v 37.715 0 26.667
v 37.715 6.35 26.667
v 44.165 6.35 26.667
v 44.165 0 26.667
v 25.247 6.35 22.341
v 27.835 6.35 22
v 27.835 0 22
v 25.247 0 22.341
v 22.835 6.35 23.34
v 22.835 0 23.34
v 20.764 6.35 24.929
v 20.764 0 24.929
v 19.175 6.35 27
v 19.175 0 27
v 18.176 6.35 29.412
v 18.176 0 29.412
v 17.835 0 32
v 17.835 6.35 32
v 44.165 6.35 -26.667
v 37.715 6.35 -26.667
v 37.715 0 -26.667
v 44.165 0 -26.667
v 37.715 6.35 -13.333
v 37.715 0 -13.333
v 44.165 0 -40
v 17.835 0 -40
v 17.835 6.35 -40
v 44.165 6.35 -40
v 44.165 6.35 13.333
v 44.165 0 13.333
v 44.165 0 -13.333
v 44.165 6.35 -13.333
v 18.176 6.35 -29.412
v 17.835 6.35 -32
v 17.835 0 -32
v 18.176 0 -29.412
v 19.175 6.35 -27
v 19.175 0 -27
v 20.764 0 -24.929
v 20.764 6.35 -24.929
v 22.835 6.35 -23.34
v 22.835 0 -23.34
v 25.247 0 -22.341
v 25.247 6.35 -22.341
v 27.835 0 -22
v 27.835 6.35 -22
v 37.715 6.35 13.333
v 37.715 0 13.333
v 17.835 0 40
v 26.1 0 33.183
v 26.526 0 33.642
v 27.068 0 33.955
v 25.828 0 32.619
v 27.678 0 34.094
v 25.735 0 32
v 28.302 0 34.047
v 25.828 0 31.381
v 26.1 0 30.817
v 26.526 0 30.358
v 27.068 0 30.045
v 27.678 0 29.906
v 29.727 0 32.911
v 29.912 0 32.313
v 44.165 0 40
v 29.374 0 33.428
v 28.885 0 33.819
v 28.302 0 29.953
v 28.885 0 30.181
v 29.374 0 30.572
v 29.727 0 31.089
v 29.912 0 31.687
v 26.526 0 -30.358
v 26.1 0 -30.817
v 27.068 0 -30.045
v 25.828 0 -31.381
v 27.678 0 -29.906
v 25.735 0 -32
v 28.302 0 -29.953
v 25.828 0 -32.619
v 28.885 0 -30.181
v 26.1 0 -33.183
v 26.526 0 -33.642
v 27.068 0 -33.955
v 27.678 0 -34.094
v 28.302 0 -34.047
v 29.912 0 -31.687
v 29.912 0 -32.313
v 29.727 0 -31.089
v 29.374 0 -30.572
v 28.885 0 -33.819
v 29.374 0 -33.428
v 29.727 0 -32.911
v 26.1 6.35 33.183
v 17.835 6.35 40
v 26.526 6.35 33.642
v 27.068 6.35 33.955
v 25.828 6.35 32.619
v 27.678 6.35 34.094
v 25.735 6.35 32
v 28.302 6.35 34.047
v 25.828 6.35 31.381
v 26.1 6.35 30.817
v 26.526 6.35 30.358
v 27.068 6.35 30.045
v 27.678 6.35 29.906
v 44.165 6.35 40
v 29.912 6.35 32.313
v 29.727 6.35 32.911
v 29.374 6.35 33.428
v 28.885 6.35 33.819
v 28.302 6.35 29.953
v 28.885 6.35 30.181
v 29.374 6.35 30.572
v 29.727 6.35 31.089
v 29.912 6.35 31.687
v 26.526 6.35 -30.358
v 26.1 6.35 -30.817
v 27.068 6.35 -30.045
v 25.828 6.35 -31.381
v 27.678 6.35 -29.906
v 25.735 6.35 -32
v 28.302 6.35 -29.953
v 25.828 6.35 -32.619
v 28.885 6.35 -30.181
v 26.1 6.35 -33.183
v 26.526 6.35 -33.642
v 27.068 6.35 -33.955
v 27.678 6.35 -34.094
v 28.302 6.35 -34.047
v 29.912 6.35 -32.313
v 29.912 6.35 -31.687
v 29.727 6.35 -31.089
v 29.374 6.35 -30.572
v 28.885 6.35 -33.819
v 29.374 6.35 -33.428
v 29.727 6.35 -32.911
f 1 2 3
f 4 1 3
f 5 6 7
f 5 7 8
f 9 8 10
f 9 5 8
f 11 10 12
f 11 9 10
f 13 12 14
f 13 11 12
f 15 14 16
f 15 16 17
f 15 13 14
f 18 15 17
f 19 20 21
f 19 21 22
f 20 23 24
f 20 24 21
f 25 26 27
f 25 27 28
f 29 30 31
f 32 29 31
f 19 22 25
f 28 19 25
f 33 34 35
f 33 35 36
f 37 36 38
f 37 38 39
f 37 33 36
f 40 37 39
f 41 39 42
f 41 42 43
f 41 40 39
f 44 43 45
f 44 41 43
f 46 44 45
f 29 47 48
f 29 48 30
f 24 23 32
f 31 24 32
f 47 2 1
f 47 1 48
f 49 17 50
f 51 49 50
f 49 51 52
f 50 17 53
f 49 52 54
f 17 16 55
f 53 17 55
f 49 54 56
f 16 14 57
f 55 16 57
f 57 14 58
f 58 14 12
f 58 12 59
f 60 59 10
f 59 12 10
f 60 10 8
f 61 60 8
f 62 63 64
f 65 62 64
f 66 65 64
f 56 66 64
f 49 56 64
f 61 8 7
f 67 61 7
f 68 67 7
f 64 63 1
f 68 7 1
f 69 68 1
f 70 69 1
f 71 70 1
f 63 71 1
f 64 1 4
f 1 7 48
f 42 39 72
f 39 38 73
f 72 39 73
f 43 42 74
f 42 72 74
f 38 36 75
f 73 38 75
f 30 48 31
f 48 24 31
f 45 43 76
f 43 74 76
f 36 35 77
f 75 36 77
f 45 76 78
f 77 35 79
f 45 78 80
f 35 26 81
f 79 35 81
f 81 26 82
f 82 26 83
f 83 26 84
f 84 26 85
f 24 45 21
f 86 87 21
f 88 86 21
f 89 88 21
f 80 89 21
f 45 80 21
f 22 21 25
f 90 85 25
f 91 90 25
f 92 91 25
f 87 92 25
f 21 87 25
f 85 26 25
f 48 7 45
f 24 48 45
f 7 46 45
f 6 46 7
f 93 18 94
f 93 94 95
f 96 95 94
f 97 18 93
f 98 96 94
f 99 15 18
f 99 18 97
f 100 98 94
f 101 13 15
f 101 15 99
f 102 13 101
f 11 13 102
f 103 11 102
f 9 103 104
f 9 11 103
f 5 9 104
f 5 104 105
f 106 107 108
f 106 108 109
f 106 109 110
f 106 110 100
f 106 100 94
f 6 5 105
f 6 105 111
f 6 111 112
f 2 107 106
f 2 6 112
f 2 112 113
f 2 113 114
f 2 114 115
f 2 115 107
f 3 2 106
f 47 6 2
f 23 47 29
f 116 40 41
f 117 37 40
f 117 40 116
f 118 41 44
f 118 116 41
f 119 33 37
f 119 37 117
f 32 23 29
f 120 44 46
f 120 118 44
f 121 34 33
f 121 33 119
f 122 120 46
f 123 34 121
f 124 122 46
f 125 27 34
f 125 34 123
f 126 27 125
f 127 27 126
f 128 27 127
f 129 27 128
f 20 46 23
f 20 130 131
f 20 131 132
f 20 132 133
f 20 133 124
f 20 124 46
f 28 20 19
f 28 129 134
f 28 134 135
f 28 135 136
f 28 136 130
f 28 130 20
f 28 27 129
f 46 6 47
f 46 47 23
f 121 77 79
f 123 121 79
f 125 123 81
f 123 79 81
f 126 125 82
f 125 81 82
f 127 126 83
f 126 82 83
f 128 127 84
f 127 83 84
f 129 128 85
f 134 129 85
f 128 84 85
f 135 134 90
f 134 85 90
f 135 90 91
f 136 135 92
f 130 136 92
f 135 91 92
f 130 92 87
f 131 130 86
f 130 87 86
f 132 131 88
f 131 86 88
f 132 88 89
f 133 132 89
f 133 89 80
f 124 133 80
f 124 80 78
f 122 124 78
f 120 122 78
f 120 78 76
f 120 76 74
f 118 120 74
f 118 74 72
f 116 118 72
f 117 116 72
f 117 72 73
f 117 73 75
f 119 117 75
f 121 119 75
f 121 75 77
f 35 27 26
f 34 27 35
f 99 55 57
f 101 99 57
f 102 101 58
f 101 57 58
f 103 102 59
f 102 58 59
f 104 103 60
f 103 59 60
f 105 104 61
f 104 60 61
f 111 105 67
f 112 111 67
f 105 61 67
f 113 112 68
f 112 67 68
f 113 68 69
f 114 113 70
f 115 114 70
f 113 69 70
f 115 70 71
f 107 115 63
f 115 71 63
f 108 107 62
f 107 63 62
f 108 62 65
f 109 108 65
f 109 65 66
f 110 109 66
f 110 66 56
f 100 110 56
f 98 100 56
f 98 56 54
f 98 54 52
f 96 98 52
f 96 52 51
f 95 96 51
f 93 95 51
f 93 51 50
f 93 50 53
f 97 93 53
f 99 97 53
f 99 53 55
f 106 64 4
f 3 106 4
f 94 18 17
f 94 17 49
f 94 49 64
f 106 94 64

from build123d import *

# Parameters (mm, degrees)
SKETCH2_W           = 88.33
SKETCH2_H           = 80
BOSS_EXTRUDE1_DEPTH = 6.35
SKETCH3_W           = 6.45
SKETCH3_H           = 13.333333334
CUT_EXTRUDE1_DEPTH  = 60.923866072
M5_TAPPED_HOLE1_D   = 4.2
CUT_EXTRUDE2_DEPTH  = 10
CUT_EXTRUDE3_REACH  = 61.924


with BuildPart() as part:
    # Sketch2 → Boss-Extrude1 (new body)
    with BuildSketch(Plane(origin=(0, 0, 0), x_dir=(1, 0, 0), z_dir=(0, 1, 0))):
        Rectangle(SKETCH2_W, SKETCH2_H)
    extrude(amount=BOSS_EXTRUDE1_DEPTH)

    # Sketch3 → Cut-Extrude1 (cut, through all)
    with BuildSketch(Plane(origin=(0, 6.35, 0), x_dir=(1, 0, 0), z_dir=(0, 1, 0))):
        with Locations((40.94, -20)):
            Rectangle(SKETCH3_W, SKETCH3_H)
        with Locations((40.94, 20)):
            Rectangle(SKETCH3_W, SKETCH3_H)
    extrude(amount=-CUT_EXTRUDE1_DEPTH, mode=Mode.SUBTRACT)

    # M5 Tapped Hole1 (through all)
    with Locations(Plane(origin=(0, 6.35, 0), x_dir=(1, 0, 0), z_dir=(0, 1, 0))):
        with Locations((-36.165, 32), (27.835, 32), (-36.165, -32), (27.835, -32)):
            Hole(M5_TAPPED_HOLE1_D / 2)

    # Sketch7 → Cut-Extrude2 (cut)
    with BuildSketch(Plane(origin=(0, 6.35, 0), x_dir=(1, 0, 0), z_dir=(0, 1, 0))):
        with BuildLine():
            Line((-26.165, 32), (-14.165, 32))
            ThreePointArc((-14.165, 32), (-10.629466094, 30.535533906), (-9.165, 27))
            Line((-9.165, 27), (-9.165, 10))
            ThreePointArc((-9.165, 10), (-10.629466094, 6.464466094), (-14.165, 5))
            Line((-14.165, 5), (-31.165, 5))
            ThreePointArc((-31.165, 5), (-34.700533906, 6.464466094), (-36.165, 10))
            Line((-36.165, 10), (-36.165, 22))
            ThreePointArc((-36.165, 22), (-29.093932188, 24.928932188), (-26.165, 32))
        make_face()
        with BuildLine():
            Line((-31.165, -5), (-14.165, -5))
            ThreePointArc((-14.165, -5), (-10.629466094, -6.464466094), (-9.165, -10))
            Line((-9.165, -10), (-9.165, -27))
            ThreePointArc((-9.165, -27), (-10.629466094, -30.535533906), (-14.165, -32))
            Line((-14.165, -32), (-26.165, -32))
            ThreePointArc((-26.165, -32), (-29.093932188, -24.928932188), (-36.165, -22))
            Line((-36.165, -22), (-36.165, -10))
            ThreePointArc((-36.165, -10), (-34.700533906, -6.464466094), (-31.165, -5))
        make_face()
        with BuildLine():
            Line((27.835, 22), (27.835, 10))
            ThreePointArc((27.835, 10), (26.370533906, 6.464466094), (22.835, 5))
            Line((22.835, 5), (5.835, 5))
            ThreePointArc((5.835, 5), (2.299466094, 6.464466094), (0.835, 10))
            Line((0.835, 10), (0.835, 27))
            ThreePointArc((0.835, 27), (2.299466094, 30.535533906), (5.835, 32))
            Line((5.835, 32), (17.835, 32))
            ThreePointArc((17.835, 32), (20.763932188, 24.928932188), (27.835, 22))
        make_face()
        with BuildLine():
            Line((17.835, -32), (5.835, -32))
            ThreePointArc((5.835, -32), (2.299466094, -30.535533906), (0.835, -27))
            Line((0.835, -27), (0.835, -10))
            ThreePointArc((0.835, -10), (2.299466094, -6.464466094), (5.835, -5))
            Line((5.835, -5), (22.835, -5))
            ThreePointArc((22.835, -5), (26.370533906, -6.464466094), (27.835, -10))
            Line((27.835, -10), (27.835, -22))
            ThreePointArc((27.835, -22), (20.763932188, -24.928932188), (17.835, -32))
        make_face()
    extrude(amount=-CUT_EXTRUDE2_DEPTH, mode=Mode.SUBTRACT)

    # Sketch8 → Cut-Extrude3 (cut, up to next)
    with BuildSketch(Plane(origin=(0, 6.35, 0), x_dir=(1, 0, 0), z_dir=(0, 1, 0)), mode=Mode.PRIVATE) as cut_extrude3_sk1:
        with BuildLine():
            Line((17.835, 45), (17.835, 32))
            ThreePointArc((17.835, 32), (20.763932188, 24.928932188), (27.835, 22))
            Line((27.835, 22), (27.835, -22))
            ThreePointArc((27.835, -22), (20.763932188, -24.928932188), (17.835, -32))
            Line((17.835, -32), (17.835, -45))
            Line((17.835, -45), (-49.165, -45))
            Line((-49.165, -45), (-49.165, 45))
            Line((-49.165, 45), (17.835, 45))
        make_face()
    cut_extrude3_tool1 = extrude(cut_extrude3_sk1.sketch, amount=-CUT_EXTRUDE3_REACH, mode=Mode.PRIVATE) & part.part
    add(cut_extrude3_tool1.solids().sort_by_distance((-12.82853, 6.35, 0))[0], mode=Mode.SUBTRACT)


solid = part.part
